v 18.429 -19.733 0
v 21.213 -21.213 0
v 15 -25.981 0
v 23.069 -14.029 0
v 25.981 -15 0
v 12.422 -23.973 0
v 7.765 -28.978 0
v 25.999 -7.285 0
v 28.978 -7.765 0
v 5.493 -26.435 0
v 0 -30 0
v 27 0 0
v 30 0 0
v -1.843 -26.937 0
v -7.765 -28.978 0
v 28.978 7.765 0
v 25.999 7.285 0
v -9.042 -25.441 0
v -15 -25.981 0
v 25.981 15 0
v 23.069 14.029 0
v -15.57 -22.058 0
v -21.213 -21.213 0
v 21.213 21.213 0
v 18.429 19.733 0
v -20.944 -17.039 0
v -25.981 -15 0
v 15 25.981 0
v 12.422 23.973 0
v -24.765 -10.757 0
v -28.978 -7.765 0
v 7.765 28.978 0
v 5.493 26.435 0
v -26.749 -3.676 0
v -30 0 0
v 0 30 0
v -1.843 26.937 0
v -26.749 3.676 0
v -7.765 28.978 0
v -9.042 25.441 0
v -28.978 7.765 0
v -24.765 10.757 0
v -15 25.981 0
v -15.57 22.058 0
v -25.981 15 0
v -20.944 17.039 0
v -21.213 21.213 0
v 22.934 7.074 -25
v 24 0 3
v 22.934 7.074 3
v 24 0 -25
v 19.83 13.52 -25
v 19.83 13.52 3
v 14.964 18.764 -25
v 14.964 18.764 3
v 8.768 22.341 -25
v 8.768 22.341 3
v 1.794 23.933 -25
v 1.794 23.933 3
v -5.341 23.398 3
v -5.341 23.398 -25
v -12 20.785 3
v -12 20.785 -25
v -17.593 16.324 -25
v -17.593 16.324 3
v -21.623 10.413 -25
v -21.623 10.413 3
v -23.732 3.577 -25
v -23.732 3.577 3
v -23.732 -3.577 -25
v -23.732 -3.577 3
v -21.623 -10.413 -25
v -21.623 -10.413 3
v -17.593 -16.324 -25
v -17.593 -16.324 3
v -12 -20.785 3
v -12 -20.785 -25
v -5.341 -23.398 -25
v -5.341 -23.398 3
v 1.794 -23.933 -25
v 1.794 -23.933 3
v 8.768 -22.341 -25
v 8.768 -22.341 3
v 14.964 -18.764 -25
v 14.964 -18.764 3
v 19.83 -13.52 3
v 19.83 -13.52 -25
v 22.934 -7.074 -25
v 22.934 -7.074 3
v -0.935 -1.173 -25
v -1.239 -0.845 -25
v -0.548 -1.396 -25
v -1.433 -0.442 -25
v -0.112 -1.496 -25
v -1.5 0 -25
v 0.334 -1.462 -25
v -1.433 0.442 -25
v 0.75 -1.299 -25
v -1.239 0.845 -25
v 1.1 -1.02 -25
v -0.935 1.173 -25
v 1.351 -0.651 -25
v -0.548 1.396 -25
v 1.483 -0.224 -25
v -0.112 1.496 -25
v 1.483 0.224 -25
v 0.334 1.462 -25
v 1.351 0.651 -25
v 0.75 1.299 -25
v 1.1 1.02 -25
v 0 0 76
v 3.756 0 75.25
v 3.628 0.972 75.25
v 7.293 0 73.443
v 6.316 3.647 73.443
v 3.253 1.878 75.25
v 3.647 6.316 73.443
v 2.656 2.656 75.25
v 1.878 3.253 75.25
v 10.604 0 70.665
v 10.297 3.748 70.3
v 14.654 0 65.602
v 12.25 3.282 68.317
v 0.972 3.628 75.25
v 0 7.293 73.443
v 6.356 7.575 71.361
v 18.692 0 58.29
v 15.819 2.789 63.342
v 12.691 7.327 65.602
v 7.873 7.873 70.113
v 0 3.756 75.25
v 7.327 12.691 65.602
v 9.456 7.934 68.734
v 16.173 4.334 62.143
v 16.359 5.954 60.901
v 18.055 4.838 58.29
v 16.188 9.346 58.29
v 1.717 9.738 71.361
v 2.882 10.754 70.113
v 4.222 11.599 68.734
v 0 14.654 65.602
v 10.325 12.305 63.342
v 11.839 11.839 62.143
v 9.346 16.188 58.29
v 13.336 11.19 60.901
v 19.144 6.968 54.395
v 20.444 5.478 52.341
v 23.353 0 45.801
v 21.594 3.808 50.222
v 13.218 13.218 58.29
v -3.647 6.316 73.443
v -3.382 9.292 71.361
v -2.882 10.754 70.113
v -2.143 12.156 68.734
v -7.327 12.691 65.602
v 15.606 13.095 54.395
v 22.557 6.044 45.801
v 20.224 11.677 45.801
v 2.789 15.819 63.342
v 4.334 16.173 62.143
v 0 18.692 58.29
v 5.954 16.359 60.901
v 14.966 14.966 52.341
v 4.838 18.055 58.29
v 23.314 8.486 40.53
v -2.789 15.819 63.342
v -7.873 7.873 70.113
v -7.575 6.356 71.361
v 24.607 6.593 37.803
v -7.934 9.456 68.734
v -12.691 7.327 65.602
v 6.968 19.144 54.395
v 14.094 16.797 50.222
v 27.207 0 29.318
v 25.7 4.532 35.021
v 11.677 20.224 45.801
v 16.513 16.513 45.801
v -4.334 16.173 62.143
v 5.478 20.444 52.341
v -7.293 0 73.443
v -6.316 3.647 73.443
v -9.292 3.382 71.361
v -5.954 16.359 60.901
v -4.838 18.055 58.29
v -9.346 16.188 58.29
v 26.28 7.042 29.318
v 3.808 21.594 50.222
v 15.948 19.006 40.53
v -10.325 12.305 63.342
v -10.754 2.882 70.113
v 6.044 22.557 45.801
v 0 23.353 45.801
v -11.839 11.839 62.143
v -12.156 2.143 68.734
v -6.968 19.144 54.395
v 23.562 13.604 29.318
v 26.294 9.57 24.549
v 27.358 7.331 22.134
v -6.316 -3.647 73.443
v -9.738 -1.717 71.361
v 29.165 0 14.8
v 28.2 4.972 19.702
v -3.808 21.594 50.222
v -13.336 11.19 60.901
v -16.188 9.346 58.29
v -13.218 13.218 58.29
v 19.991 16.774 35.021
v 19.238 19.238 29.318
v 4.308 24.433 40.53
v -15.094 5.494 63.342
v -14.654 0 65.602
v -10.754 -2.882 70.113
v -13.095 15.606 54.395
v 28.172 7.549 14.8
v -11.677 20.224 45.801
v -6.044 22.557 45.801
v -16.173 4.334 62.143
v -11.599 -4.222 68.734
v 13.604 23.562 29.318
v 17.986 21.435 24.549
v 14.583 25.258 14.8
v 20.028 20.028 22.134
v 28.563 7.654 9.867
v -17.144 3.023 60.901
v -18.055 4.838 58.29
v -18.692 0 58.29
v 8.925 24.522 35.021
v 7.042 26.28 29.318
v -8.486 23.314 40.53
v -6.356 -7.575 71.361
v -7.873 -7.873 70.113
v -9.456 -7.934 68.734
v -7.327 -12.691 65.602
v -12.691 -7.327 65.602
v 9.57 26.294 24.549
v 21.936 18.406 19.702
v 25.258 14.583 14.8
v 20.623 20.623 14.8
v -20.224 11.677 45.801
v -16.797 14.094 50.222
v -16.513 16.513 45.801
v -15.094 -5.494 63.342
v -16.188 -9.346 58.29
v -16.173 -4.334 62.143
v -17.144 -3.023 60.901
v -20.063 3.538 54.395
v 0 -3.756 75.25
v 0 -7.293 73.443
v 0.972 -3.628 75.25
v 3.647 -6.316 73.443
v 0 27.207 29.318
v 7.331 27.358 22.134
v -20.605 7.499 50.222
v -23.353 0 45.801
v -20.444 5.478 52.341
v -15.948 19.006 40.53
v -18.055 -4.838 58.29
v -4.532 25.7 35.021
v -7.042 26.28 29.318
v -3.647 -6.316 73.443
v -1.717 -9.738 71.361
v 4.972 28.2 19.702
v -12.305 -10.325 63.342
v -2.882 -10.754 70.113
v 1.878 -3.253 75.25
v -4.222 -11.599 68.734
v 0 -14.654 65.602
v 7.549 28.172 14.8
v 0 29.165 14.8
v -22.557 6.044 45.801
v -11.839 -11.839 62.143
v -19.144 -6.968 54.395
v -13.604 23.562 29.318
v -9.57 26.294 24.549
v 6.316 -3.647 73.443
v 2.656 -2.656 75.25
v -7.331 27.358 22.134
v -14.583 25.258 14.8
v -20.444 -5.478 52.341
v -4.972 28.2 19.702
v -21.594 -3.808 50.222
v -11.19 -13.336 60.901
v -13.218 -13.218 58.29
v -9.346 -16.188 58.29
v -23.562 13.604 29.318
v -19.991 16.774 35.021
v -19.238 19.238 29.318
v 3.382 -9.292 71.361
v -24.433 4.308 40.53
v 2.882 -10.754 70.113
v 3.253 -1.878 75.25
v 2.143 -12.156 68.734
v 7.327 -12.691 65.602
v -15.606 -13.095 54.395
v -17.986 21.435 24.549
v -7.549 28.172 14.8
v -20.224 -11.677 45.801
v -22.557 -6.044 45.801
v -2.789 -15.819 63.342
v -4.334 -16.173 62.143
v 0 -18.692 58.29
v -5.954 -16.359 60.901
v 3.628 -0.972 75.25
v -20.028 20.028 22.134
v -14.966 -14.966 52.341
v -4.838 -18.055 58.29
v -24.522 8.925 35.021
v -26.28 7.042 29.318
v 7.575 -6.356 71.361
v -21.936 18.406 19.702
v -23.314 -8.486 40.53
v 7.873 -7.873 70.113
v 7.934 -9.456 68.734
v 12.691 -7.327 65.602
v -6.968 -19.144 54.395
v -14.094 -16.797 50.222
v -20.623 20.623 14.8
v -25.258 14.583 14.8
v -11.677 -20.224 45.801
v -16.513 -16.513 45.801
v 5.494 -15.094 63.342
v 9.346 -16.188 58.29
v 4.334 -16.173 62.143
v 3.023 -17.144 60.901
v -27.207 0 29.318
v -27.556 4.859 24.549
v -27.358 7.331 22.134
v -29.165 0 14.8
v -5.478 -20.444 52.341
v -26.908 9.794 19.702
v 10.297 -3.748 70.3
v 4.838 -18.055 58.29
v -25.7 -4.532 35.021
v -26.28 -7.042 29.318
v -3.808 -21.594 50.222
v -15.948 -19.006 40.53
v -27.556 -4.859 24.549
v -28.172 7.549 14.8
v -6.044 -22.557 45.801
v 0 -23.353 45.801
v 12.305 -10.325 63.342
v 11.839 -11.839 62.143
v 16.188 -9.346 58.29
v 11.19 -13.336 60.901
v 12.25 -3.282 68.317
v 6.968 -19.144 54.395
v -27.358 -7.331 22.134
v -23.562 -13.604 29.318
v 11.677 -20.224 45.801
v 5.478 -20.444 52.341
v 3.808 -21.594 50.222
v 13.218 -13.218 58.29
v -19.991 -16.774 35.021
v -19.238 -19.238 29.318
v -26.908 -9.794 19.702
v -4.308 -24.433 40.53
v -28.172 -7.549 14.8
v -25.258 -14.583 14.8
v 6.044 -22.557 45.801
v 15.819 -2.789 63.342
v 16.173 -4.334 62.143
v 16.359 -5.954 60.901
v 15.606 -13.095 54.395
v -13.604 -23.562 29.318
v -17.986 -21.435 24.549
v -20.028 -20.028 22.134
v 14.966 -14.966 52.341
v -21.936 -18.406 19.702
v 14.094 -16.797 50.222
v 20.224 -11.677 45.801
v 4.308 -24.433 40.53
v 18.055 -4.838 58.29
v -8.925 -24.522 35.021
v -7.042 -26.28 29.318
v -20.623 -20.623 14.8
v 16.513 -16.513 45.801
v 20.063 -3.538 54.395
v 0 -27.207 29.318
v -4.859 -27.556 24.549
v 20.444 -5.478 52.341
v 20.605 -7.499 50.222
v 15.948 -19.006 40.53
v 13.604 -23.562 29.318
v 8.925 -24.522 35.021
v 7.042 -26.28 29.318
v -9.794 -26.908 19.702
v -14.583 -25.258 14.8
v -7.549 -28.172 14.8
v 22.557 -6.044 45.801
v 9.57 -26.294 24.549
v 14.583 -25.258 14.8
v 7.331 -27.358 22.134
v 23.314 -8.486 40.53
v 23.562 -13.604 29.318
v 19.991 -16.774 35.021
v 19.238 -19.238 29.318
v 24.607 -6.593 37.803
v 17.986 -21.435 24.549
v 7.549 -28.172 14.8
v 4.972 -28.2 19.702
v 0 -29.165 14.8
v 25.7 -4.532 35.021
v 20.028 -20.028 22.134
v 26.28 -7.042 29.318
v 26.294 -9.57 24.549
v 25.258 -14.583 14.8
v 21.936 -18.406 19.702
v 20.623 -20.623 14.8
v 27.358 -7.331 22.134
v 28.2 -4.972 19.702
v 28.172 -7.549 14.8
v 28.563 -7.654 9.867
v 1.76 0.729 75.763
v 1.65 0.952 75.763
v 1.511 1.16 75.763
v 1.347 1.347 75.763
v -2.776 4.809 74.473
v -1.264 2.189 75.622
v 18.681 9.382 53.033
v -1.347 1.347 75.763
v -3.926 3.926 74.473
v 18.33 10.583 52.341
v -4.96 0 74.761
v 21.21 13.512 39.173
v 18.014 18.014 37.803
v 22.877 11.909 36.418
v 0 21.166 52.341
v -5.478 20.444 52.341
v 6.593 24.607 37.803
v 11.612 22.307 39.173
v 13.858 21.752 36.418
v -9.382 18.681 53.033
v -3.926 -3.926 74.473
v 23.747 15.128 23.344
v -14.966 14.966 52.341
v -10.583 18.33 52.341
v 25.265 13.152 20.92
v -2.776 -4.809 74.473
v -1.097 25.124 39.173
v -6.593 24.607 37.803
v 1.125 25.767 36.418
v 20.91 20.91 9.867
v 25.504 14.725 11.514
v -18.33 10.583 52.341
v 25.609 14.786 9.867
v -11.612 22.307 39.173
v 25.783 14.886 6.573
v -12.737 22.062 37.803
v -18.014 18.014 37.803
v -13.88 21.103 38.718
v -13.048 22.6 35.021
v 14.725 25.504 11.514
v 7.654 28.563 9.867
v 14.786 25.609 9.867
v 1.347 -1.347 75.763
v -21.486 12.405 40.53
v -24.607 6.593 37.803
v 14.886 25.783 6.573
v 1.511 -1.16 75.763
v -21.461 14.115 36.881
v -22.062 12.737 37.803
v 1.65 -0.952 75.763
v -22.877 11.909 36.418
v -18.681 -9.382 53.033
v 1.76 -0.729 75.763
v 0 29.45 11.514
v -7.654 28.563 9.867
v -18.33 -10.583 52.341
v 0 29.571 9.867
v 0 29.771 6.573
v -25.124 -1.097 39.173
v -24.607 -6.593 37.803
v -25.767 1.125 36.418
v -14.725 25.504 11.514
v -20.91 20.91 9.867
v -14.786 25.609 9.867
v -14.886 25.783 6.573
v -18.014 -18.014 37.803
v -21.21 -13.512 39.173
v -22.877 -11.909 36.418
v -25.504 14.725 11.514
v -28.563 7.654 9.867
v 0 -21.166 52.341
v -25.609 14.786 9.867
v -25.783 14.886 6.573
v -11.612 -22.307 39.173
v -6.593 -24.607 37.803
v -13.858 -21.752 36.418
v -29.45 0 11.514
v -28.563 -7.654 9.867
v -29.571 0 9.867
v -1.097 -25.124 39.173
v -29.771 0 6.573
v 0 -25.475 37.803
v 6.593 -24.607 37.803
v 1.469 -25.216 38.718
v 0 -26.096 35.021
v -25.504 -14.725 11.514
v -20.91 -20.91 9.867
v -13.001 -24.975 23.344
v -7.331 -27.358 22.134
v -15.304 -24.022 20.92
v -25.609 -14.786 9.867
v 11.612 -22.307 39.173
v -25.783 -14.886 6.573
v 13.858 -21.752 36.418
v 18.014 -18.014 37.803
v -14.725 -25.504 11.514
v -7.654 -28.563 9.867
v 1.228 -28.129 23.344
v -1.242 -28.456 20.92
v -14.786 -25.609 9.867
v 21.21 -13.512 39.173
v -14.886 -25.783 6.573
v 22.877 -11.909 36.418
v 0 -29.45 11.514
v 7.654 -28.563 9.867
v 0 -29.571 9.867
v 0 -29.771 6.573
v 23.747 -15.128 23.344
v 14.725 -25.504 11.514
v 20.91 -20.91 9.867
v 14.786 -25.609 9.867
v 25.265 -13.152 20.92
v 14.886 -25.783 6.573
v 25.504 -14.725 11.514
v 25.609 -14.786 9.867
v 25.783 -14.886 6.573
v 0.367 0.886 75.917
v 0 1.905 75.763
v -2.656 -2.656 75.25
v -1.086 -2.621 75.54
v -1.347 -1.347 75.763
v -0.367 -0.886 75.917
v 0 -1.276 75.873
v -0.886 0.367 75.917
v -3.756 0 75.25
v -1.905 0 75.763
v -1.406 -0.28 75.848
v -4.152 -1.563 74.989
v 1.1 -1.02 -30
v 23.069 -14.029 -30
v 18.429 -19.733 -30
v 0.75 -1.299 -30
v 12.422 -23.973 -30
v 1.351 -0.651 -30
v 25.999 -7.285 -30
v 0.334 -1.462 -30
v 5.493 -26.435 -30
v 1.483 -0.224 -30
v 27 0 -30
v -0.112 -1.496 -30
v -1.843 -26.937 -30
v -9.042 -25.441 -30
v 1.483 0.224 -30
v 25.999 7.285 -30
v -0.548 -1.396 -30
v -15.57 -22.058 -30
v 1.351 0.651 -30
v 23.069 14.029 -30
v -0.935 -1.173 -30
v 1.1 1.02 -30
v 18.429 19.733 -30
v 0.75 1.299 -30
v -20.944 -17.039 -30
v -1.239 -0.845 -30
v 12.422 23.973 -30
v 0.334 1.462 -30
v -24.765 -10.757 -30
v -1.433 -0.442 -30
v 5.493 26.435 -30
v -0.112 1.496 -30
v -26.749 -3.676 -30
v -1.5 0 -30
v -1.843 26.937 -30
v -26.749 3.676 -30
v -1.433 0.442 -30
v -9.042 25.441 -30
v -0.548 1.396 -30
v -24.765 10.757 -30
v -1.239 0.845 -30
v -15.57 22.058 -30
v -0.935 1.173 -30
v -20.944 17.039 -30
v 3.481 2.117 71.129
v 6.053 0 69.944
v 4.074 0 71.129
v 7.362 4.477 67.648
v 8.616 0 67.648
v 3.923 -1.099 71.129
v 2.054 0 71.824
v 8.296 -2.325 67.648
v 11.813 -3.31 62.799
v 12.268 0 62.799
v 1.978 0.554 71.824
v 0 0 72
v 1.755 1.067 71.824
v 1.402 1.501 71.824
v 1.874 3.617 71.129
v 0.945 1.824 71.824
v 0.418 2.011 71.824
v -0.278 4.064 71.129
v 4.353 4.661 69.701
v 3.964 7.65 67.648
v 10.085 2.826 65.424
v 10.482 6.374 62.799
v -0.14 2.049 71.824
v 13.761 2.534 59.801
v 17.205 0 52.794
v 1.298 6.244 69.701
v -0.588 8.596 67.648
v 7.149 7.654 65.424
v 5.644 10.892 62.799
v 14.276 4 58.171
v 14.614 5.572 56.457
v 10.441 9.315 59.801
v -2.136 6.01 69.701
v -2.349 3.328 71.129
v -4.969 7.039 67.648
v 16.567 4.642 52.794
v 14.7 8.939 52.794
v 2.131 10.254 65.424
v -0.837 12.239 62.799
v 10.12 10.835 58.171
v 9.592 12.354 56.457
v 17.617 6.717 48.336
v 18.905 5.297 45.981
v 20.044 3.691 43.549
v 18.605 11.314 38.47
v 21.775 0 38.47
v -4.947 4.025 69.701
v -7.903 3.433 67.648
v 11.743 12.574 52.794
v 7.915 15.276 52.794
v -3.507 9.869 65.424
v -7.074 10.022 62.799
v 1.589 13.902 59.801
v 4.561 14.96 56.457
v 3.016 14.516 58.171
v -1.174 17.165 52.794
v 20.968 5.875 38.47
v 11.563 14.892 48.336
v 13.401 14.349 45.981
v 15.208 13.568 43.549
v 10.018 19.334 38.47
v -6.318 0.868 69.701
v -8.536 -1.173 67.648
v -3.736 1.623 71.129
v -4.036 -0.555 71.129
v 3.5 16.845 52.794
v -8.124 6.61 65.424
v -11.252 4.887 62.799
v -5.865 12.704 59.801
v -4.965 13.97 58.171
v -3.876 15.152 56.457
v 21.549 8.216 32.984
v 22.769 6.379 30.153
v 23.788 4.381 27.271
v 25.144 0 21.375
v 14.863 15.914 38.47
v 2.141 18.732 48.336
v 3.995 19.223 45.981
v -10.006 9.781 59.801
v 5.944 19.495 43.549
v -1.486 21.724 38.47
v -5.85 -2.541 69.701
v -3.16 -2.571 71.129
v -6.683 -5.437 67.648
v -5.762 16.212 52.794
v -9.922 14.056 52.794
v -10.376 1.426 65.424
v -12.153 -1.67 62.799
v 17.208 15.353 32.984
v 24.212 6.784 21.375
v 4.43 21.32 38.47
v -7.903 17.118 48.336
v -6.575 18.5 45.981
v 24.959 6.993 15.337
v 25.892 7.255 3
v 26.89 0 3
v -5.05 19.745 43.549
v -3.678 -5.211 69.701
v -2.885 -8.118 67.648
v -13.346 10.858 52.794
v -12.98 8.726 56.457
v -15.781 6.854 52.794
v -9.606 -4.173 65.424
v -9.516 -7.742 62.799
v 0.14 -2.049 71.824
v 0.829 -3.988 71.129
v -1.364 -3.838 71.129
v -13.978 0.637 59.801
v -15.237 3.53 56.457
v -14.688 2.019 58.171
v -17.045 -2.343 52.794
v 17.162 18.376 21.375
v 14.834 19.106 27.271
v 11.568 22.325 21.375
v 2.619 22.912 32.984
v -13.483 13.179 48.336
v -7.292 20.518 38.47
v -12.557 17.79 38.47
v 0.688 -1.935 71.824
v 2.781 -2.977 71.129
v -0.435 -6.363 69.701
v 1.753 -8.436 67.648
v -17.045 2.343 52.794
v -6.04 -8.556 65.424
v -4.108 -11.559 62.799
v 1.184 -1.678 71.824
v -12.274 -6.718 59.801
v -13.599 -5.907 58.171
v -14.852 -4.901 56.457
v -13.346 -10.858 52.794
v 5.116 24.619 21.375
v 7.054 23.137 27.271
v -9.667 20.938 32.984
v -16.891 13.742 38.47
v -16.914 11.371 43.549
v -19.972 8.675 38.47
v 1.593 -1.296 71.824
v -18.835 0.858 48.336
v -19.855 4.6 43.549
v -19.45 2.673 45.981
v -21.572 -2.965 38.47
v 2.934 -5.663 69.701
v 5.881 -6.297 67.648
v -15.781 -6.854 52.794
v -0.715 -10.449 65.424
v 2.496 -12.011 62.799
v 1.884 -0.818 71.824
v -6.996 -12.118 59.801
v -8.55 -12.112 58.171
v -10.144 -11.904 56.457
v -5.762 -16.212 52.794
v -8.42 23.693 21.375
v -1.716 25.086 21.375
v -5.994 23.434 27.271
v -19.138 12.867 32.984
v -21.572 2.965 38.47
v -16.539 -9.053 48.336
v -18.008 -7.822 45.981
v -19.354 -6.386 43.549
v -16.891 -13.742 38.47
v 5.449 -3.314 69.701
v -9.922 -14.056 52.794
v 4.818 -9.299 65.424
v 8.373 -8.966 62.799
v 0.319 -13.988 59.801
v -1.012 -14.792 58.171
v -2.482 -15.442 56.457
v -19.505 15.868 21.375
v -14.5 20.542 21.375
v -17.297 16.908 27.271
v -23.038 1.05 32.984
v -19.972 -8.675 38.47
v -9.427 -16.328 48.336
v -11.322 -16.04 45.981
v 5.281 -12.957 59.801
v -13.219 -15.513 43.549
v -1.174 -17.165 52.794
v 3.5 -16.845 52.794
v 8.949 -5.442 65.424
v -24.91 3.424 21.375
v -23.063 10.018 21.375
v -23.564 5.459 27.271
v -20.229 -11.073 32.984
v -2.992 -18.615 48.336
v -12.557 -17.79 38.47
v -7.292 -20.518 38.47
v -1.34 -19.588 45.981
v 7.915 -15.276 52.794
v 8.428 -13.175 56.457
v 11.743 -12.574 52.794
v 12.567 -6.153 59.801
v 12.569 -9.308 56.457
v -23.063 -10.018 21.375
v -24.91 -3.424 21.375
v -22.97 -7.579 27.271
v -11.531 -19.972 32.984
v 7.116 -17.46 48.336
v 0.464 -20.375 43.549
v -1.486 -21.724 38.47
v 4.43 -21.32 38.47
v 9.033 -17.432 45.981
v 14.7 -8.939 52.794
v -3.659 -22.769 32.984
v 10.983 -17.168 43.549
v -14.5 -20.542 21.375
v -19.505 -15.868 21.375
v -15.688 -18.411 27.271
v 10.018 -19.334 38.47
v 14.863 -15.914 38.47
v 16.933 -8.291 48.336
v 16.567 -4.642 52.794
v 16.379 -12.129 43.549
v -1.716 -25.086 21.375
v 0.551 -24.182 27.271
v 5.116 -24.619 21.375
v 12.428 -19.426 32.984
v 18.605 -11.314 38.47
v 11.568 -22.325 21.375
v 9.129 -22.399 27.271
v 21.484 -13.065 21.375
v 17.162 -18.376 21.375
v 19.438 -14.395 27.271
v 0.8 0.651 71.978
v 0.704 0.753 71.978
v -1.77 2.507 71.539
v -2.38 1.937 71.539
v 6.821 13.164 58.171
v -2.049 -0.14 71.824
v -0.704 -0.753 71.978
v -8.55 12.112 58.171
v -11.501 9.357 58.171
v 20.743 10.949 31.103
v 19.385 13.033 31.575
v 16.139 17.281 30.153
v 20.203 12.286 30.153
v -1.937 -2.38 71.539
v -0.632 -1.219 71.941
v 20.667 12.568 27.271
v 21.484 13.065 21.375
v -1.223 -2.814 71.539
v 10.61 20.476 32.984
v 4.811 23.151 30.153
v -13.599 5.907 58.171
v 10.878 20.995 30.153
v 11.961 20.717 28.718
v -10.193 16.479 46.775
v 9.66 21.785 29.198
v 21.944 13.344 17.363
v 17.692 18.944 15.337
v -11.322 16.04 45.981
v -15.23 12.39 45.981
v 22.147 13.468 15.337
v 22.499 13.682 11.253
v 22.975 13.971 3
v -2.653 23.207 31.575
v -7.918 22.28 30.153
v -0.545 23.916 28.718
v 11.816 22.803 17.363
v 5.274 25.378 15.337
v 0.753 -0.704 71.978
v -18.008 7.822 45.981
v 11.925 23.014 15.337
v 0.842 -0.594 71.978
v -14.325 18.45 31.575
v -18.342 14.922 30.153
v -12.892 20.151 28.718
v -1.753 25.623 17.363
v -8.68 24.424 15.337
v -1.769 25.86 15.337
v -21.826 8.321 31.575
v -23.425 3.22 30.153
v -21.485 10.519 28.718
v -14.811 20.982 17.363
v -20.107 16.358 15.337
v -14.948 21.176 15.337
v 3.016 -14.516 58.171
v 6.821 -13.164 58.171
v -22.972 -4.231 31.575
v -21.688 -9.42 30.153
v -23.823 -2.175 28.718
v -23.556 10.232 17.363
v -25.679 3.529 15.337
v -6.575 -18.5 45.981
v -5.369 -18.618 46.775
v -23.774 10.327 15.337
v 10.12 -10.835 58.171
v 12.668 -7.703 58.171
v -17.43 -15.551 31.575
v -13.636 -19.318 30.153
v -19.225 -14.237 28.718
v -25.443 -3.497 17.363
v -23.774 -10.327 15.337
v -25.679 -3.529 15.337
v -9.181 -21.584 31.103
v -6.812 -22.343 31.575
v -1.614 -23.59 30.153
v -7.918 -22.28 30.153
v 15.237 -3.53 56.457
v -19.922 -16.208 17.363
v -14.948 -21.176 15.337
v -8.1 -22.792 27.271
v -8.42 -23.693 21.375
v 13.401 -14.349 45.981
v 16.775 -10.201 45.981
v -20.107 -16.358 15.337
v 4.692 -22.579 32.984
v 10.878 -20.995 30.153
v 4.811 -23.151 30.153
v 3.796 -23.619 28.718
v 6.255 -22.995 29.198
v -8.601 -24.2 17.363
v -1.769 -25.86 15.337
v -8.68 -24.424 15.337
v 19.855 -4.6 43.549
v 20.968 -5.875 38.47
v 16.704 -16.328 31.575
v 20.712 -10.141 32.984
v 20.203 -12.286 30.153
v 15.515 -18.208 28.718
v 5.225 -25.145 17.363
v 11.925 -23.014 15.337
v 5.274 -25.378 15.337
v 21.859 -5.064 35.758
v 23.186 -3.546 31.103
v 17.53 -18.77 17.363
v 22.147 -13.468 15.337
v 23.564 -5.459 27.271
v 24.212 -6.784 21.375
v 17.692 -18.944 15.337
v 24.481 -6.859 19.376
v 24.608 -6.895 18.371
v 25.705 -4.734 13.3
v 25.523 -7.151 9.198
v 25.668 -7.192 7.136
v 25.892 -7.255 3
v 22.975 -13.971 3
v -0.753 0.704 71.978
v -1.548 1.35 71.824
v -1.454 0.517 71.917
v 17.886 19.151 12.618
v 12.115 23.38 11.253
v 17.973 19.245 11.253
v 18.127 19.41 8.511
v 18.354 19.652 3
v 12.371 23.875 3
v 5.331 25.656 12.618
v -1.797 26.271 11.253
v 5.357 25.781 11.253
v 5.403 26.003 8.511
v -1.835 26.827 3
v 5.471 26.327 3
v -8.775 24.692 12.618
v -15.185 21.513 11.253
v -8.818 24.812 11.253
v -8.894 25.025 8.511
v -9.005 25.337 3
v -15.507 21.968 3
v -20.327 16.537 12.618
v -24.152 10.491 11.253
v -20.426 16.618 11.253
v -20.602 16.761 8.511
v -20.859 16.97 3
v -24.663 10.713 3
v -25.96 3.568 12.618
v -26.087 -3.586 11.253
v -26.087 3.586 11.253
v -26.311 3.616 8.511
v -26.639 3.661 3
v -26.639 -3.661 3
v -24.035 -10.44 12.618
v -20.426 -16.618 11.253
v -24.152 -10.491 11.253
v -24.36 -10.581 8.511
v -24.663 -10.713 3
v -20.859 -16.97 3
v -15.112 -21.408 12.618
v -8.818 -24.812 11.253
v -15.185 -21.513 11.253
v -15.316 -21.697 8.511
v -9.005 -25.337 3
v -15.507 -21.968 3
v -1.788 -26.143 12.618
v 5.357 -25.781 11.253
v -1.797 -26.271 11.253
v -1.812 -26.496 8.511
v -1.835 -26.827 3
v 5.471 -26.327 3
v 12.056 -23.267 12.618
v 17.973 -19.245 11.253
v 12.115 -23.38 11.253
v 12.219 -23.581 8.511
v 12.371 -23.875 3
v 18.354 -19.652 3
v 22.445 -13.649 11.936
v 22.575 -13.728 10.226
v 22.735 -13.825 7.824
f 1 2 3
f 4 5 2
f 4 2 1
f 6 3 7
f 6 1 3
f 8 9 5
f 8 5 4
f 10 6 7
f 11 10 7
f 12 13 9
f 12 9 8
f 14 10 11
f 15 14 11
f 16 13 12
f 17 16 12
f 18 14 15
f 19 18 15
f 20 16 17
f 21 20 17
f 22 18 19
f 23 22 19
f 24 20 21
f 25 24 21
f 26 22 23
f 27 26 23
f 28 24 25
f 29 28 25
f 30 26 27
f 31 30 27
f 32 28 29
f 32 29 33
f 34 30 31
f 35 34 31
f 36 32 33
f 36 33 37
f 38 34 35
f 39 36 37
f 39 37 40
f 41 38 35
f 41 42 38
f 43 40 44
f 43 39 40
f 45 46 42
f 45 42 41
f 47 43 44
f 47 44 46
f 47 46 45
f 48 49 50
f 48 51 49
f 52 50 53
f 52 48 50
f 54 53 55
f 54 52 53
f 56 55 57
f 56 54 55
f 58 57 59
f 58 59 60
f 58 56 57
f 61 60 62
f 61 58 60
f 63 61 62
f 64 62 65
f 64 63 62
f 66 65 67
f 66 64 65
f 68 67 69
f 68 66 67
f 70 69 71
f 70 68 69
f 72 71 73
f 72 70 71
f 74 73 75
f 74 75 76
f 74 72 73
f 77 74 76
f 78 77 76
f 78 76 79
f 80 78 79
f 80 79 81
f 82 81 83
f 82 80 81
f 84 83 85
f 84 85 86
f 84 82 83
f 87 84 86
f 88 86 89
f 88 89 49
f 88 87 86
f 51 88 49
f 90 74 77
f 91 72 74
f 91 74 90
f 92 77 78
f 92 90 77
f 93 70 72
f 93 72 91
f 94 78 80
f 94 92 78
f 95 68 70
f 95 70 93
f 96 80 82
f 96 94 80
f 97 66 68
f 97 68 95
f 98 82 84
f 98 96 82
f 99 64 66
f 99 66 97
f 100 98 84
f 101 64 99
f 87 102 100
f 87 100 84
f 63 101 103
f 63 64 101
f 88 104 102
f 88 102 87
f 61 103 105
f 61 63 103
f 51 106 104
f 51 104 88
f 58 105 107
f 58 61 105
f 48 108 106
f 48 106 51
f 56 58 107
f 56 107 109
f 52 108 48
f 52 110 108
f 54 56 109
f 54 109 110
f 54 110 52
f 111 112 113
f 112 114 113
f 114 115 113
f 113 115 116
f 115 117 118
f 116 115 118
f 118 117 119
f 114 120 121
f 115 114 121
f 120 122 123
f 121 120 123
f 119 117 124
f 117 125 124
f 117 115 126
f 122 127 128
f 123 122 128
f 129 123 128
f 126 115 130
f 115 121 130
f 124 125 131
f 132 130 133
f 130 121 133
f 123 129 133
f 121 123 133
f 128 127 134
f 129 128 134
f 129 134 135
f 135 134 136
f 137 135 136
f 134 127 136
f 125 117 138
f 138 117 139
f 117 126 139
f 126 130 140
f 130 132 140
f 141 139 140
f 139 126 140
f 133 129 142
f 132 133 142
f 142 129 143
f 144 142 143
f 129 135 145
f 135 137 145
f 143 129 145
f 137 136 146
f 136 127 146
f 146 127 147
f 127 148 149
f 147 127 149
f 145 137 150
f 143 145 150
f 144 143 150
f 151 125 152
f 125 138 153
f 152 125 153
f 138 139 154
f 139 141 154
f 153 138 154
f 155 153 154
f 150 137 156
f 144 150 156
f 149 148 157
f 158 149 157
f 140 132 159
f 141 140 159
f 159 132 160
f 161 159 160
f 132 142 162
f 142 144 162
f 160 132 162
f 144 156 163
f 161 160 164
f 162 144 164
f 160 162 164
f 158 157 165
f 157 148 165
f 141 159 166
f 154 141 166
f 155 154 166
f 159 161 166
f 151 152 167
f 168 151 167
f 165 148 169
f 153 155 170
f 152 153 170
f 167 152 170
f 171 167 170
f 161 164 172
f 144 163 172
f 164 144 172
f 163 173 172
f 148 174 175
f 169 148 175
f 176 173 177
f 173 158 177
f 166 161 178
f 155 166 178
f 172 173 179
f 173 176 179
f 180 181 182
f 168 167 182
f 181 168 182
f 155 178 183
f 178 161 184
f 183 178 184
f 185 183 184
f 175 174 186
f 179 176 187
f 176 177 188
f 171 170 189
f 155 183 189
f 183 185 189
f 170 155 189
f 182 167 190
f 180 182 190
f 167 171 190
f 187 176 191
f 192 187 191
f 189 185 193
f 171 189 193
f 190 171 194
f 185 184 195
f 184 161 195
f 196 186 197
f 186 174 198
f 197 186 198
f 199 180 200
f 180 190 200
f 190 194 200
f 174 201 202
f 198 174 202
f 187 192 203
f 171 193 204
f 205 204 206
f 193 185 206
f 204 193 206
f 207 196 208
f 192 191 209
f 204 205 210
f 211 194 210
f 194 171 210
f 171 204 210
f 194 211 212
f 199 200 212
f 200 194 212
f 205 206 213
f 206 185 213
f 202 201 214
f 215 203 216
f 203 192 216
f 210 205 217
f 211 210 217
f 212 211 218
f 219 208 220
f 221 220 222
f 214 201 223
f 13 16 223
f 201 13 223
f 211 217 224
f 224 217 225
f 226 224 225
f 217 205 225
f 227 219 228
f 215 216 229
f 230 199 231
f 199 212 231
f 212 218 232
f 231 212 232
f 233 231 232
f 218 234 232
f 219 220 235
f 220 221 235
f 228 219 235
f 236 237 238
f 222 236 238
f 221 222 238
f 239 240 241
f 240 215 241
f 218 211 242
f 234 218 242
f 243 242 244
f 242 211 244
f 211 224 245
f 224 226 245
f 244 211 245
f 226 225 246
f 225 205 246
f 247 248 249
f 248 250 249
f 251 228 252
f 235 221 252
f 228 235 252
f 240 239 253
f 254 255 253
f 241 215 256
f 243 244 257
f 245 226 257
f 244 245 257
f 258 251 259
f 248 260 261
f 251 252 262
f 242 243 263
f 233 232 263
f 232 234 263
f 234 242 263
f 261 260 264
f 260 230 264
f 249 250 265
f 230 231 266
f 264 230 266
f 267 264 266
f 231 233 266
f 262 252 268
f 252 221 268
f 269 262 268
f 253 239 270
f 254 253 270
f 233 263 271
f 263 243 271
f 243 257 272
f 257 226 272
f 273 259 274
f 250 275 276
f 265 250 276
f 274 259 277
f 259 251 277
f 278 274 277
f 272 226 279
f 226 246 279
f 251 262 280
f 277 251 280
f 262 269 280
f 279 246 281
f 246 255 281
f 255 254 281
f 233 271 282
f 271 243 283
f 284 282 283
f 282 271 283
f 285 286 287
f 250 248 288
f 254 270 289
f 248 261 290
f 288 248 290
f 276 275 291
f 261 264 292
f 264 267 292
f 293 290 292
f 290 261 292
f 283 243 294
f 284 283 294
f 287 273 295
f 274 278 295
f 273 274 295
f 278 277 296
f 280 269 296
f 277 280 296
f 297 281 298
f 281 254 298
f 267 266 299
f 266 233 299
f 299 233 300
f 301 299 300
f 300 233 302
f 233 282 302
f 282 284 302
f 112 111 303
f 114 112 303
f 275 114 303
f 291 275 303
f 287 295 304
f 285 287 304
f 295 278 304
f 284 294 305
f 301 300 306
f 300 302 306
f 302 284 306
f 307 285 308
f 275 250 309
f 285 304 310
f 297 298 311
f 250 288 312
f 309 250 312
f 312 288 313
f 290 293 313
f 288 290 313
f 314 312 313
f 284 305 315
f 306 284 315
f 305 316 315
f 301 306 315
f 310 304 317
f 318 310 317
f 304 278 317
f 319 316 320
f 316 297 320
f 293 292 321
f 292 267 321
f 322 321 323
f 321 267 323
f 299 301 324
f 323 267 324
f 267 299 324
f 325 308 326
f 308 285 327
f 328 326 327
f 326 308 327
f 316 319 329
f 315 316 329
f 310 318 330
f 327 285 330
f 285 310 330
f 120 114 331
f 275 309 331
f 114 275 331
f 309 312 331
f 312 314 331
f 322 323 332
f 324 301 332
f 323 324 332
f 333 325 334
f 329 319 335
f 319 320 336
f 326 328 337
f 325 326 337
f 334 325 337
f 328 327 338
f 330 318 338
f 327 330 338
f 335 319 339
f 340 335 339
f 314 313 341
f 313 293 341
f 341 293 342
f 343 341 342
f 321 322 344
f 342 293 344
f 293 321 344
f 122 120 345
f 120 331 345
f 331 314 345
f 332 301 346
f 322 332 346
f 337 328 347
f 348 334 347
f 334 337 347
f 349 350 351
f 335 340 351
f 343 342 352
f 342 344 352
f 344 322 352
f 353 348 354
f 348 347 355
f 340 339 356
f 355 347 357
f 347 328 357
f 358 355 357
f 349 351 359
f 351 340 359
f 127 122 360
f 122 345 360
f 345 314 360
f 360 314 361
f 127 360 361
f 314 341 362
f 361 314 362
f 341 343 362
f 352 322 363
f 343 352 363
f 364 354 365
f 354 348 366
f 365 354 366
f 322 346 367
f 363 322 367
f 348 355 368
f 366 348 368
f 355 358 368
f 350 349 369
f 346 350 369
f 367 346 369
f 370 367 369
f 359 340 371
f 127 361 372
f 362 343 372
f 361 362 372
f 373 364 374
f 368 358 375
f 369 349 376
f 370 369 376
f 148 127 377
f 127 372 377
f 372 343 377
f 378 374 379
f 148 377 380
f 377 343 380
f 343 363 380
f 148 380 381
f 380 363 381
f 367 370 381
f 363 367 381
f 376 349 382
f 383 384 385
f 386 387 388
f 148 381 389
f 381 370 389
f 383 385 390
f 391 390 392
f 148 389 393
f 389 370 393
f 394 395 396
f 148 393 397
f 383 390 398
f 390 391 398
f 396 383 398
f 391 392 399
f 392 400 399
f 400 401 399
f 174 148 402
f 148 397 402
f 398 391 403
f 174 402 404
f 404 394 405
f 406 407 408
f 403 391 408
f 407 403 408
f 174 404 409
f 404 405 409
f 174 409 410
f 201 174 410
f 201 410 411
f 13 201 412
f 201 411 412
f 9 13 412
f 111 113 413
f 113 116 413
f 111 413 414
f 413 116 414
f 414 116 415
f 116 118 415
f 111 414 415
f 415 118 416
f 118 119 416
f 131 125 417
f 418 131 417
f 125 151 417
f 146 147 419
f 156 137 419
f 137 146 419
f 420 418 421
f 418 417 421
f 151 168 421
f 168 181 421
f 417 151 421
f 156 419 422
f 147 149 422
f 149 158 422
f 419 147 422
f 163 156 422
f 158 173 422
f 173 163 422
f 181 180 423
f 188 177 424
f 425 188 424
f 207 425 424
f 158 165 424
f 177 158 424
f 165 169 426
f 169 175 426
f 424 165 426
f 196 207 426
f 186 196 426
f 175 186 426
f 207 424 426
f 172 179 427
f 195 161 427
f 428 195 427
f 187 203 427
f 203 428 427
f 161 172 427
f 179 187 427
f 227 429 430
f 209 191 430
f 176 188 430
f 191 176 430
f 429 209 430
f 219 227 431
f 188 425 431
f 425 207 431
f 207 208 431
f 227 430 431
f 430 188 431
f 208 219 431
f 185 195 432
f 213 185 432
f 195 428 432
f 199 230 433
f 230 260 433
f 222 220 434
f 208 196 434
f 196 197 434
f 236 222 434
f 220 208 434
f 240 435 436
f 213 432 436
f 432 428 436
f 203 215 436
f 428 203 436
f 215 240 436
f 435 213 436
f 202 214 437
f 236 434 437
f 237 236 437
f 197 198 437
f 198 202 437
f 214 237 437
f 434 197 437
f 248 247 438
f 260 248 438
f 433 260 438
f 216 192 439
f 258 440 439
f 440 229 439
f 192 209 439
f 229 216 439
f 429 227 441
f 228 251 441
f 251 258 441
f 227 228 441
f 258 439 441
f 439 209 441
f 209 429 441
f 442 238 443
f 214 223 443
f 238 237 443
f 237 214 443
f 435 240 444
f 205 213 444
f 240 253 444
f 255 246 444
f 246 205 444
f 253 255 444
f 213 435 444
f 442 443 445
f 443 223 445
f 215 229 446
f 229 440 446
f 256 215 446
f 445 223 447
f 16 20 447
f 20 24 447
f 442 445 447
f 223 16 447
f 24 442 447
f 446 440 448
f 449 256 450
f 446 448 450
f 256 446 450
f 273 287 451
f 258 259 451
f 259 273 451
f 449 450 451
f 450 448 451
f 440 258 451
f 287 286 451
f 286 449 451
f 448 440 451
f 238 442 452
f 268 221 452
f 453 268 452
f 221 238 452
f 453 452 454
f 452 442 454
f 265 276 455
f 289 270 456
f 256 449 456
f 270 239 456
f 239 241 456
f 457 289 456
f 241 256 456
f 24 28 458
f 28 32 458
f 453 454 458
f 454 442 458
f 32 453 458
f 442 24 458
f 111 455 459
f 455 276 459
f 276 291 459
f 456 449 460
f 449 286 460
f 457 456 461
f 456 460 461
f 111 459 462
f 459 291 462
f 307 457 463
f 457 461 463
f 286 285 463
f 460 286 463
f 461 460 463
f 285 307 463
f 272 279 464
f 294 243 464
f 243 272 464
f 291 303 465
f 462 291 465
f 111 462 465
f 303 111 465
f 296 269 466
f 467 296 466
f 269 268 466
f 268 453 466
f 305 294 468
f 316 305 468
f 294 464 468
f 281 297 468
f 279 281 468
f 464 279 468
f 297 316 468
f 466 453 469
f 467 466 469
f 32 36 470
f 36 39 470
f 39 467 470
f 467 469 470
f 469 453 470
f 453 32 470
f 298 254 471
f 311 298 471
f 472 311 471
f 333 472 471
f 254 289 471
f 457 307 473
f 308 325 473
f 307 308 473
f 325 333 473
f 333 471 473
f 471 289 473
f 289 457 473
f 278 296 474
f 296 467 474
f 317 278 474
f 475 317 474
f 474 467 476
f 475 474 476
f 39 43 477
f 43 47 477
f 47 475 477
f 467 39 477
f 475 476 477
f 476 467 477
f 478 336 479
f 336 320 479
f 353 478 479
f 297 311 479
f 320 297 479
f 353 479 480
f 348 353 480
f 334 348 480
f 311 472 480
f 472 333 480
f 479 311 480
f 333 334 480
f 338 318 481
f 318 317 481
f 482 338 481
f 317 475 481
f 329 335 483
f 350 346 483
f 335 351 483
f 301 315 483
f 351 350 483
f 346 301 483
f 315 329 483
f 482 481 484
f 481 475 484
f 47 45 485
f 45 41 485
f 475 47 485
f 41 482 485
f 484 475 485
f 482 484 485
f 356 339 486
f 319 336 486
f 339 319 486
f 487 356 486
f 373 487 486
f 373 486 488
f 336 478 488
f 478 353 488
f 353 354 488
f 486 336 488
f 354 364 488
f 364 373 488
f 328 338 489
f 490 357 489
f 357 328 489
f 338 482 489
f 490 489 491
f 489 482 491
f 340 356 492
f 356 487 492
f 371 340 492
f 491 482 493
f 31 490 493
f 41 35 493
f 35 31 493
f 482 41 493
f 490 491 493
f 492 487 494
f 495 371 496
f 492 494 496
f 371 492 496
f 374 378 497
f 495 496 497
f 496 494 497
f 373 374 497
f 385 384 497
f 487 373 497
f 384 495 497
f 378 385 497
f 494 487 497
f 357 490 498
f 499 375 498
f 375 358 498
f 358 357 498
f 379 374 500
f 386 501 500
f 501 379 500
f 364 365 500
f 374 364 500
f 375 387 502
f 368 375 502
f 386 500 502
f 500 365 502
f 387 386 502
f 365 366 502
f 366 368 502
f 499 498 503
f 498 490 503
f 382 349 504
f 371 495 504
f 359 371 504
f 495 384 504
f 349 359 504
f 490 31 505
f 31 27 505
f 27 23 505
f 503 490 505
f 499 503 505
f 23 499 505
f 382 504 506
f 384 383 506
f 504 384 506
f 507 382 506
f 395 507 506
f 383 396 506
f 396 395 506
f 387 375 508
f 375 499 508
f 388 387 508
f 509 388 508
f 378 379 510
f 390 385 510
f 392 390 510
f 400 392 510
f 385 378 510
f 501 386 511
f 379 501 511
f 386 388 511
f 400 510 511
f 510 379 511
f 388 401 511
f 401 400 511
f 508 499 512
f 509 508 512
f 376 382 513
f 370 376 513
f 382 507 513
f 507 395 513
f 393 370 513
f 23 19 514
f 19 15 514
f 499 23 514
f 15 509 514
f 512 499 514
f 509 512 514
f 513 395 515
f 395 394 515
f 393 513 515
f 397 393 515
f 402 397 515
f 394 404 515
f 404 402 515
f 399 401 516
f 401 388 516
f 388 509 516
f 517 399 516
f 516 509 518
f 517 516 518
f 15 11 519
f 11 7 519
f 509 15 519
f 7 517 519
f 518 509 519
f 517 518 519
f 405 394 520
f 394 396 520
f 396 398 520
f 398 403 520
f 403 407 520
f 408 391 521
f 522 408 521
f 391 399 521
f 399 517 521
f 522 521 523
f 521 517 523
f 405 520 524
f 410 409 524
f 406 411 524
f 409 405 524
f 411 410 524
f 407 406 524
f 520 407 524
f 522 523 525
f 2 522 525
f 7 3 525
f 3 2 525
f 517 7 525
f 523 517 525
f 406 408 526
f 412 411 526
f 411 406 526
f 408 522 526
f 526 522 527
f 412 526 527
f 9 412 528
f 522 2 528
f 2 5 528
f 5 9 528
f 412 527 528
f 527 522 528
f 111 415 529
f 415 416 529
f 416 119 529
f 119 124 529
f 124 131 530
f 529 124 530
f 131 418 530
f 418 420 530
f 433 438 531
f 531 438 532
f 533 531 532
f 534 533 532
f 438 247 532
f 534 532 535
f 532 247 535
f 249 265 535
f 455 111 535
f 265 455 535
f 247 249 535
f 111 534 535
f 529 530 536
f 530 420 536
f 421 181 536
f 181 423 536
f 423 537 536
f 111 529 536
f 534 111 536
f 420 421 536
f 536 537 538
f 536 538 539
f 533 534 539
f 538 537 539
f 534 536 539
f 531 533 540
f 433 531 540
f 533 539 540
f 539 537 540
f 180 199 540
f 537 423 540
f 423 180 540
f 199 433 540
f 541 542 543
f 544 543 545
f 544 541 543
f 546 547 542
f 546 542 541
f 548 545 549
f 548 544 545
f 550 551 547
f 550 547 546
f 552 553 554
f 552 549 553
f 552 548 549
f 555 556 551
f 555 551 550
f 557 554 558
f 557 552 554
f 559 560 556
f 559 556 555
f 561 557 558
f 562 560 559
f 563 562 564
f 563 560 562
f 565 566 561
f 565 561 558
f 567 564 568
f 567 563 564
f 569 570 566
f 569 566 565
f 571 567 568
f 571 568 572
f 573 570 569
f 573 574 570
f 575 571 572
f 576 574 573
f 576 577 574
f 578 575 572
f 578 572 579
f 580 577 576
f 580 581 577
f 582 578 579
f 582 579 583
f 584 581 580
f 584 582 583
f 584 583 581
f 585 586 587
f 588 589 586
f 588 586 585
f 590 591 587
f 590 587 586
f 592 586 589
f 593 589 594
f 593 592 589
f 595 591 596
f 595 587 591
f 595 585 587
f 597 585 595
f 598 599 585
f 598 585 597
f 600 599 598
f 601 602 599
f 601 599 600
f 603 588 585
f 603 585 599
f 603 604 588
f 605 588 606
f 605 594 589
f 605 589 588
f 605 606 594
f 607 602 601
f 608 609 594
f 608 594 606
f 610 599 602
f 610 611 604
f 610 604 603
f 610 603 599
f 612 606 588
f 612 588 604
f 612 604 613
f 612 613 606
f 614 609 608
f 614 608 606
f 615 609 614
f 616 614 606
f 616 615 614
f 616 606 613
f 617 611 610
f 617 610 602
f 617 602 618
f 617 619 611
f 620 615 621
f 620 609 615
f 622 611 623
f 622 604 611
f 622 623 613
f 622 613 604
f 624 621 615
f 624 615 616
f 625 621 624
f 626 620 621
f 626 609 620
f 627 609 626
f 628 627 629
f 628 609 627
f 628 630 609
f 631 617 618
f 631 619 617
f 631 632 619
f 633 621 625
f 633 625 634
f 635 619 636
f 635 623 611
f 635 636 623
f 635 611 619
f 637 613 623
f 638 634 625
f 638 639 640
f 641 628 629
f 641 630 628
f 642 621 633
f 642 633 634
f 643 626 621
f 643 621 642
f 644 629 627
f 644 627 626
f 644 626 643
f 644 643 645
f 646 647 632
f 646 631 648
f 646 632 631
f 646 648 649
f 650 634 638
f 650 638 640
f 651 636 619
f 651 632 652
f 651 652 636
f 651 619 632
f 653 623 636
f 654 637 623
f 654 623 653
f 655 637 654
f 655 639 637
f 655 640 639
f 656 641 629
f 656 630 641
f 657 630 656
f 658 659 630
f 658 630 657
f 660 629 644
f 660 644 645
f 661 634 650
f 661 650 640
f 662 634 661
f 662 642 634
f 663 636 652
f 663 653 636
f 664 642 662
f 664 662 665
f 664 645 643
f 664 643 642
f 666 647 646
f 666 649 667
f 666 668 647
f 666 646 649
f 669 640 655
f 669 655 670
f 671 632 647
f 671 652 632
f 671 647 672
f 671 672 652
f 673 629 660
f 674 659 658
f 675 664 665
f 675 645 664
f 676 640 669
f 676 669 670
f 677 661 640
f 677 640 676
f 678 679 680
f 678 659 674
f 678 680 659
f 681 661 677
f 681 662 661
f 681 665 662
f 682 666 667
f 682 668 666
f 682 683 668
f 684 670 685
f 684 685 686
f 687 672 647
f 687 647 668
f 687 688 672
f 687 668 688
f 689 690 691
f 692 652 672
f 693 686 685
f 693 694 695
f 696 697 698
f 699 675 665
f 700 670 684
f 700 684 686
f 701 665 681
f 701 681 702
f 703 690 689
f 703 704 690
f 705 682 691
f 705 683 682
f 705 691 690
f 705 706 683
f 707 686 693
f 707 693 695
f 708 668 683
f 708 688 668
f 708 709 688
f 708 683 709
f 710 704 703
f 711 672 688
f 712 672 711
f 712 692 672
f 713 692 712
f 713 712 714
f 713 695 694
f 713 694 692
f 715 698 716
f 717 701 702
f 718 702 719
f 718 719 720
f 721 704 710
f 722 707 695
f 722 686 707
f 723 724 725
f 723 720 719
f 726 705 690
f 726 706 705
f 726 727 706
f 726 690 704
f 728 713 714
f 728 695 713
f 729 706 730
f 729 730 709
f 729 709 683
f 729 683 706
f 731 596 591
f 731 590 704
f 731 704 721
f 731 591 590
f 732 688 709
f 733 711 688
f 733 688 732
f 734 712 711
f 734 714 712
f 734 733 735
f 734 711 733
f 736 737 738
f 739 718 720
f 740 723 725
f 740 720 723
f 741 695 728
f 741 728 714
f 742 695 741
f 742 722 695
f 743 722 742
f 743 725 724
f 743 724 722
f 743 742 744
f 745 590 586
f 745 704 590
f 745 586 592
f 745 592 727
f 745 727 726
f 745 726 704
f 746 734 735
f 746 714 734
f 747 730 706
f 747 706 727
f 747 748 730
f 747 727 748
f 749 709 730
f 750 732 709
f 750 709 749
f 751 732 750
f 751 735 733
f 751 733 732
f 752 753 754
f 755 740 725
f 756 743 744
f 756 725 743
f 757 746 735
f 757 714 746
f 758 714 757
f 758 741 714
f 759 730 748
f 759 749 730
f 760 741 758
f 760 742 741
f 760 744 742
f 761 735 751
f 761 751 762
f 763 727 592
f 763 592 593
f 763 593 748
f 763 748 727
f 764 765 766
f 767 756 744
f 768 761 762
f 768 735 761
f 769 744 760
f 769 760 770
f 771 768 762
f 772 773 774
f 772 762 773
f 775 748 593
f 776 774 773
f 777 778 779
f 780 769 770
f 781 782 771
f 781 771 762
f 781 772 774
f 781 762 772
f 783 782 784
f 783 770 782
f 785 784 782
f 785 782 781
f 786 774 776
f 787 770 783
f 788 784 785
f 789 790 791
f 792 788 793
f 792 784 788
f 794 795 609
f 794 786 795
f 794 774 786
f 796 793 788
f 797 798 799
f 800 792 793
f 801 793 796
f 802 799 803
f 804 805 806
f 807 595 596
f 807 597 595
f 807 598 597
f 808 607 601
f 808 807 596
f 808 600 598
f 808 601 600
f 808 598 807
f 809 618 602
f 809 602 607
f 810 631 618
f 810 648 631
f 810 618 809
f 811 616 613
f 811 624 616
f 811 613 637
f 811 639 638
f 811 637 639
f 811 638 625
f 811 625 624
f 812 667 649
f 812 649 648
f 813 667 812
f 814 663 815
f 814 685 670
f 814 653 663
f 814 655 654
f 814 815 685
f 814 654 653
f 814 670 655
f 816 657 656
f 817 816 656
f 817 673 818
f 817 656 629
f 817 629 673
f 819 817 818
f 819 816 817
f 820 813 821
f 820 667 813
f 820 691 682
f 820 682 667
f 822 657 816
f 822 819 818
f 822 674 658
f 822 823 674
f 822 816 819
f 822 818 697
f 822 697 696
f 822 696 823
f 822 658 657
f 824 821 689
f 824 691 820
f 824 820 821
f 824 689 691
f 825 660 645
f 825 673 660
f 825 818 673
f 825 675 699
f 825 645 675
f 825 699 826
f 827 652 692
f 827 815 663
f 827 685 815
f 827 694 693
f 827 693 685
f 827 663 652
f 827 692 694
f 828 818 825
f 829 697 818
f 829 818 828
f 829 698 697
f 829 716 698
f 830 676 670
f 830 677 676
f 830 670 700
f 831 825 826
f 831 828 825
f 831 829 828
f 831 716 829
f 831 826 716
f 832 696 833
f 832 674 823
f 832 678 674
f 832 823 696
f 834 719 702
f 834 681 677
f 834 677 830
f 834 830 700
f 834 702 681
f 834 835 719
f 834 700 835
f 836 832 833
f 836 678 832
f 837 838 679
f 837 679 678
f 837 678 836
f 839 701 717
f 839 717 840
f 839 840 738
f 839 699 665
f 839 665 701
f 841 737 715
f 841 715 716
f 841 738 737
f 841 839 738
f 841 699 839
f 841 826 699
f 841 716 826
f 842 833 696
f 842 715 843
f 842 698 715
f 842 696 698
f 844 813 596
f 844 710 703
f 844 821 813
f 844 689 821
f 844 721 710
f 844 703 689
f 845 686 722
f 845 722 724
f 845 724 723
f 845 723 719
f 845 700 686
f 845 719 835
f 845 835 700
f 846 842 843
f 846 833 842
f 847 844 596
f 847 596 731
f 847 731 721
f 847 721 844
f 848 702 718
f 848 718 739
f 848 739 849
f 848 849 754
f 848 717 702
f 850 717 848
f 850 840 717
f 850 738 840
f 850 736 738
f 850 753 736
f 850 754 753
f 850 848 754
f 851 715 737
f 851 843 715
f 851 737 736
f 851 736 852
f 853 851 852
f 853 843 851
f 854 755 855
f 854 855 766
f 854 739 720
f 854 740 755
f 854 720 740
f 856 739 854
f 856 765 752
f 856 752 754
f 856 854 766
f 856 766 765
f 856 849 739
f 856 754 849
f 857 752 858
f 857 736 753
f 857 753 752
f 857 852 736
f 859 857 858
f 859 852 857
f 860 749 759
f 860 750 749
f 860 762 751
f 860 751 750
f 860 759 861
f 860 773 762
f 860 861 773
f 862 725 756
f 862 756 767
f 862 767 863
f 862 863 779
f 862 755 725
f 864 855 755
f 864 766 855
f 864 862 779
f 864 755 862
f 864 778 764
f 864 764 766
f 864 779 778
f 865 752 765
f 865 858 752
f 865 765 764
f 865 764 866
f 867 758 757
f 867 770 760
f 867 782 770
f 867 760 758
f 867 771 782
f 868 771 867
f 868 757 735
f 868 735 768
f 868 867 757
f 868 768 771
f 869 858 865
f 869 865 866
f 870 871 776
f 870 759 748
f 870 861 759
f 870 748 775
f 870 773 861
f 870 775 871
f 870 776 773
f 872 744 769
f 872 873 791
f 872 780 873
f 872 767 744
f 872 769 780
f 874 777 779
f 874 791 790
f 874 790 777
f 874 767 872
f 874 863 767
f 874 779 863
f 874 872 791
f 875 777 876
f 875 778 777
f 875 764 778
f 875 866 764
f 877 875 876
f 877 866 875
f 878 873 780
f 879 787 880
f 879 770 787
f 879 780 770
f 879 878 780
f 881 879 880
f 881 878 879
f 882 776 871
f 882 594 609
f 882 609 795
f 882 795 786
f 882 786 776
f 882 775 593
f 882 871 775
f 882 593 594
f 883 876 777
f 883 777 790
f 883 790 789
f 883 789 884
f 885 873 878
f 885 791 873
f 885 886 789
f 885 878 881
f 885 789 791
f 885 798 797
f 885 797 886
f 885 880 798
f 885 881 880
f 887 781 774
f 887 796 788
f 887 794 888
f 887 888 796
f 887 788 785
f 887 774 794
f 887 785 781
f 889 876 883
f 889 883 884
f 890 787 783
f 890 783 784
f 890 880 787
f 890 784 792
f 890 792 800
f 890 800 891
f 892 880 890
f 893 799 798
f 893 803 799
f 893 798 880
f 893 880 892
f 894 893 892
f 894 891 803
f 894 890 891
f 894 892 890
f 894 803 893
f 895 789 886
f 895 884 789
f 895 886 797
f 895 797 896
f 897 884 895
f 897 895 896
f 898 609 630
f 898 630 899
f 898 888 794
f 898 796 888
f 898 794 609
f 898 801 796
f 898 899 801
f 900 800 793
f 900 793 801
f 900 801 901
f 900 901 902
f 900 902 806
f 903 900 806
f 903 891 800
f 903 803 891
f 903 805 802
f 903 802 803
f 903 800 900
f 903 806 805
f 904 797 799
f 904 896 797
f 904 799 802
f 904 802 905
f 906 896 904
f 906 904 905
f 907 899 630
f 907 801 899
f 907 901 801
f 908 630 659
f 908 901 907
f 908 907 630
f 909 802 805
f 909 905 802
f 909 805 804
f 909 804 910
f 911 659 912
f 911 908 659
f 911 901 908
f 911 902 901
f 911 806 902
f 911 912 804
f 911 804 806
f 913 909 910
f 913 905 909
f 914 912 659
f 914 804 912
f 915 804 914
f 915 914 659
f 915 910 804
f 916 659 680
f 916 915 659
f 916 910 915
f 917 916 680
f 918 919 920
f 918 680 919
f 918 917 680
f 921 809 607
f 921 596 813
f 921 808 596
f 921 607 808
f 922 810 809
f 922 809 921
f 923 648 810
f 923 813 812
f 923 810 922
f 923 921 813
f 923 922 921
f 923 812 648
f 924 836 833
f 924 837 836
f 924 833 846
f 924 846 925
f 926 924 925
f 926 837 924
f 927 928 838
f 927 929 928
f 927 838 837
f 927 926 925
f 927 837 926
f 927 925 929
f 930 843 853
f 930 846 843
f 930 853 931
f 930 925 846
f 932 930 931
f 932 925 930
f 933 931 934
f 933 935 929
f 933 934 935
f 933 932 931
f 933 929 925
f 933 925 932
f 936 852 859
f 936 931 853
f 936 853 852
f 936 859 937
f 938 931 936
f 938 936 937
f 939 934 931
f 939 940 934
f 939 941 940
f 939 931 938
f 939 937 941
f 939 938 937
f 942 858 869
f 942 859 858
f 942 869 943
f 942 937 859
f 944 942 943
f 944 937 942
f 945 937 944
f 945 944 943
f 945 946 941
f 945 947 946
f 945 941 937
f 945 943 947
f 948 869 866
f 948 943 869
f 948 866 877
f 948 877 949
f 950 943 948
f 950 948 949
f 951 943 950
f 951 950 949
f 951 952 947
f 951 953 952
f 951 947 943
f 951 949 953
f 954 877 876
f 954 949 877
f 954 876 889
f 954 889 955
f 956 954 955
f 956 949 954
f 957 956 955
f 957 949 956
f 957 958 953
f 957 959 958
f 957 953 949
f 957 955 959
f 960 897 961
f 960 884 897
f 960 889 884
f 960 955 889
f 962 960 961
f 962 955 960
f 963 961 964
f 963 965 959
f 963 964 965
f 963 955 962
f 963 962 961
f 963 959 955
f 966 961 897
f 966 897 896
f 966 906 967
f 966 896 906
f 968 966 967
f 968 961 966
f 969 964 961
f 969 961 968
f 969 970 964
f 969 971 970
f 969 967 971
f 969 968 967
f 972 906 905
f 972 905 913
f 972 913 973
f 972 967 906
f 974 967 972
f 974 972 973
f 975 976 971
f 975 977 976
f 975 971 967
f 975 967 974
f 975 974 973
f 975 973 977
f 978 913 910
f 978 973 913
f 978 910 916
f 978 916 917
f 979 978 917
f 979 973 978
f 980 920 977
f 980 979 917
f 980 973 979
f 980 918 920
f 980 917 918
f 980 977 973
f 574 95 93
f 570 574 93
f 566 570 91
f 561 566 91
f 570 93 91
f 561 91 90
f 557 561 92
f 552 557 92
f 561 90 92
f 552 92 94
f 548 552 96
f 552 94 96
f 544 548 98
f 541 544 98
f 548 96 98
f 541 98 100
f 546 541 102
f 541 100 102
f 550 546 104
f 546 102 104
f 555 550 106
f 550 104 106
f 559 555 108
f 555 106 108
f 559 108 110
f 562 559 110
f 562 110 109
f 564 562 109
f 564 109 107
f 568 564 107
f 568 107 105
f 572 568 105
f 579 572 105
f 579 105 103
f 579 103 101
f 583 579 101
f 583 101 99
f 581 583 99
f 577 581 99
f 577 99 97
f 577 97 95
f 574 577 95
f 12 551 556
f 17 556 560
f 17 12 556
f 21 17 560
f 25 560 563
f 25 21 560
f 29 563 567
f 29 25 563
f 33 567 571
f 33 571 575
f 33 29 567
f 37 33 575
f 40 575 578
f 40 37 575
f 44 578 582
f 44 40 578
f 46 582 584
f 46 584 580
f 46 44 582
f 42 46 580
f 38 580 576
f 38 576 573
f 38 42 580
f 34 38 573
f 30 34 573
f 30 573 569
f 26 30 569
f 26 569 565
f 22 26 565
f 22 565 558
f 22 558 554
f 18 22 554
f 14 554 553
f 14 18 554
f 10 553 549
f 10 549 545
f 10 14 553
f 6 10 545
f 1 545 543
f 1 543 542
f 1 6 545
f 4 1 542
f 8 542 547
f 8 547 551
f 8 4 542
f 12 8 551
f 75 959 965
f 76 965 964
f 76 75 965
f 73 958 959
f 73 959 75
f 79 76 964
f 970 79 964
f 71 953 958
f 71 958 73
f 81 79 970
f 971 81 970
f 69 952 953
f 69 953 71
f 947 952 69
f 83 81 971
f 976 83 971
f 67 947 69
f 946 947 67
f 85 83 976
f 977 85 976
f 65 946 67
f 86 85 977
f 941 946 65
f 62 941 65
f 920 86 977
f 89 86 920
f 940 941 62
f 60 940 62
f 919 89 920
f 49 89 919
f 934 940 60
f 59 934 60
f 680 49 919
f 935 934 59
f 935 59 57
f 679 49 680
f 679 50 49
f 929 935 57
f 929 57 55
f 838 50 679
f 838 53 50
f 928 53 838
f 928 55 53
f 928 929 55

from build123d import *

# Parameters (mm, degrees)
F4_D     = 3
F4_DEPTH = 12
F4_TIP   = 0.9012909285


with BuildPart() as f1:
    # F0 (on Front) → F1 (revolve)
    with BuildSketch(Plane.XZ):
        with BuildLine():
            add(Edge.make_bspline(
                [(26.8895727958, 3), (26.9346478476, 2.0004075938), (26.9715210375, 1.0001471851), (27, 0)],
                knots=[74.7734725715, 74.7734725715, 74.7734725715, 74.7734725715, 76.8960337079, 76.8960337079, 76.8960337079, 76.8960337079], degree=3))
            Line((27, 0), (30, 0))
            add(Edge.make_bspline(
                [(0, 76), (18.2135365903, 75.0966593623), (29.3766844422, 35.9996296465), (30, 0)],
                knots=[0, 0, 0, 0, 81.7067928633, 81.7067928633, 81.7067928633, 81.7067928633], degree=3))
            Line((0, 76), (0, 72))
            add(Edge.make_bspline(
                [(0, 72), (13.535191017, 72.5981812348), (25.3016712319, 38.2135889442), (26.8895727958, 3)],
                knots=[0, 0, 0, 0, 74.7734725715, 74.7734725715, 74.7734725715, 74.7734725715], degree=3))
        make_face()
        with BuildLine():
            Line((27, -30), (27, 0))
            add(Edge.make_bspline(
                [(26.8895727958, 3), (26.9346478476, 2.0004075938), (26.9715210375, 1.0001471851), (27, 0)],
                knots=[74.7734725715, 74.7734725715, 74.7734725715, 74.7734725715, 76.8960337079, 76.8960337079, 76.8960337079, 76.8960337079], degree=3))
            Line((26.8895727958, 3), (24, 3))
            Line((24, 3), (24, 0))
            Line((24, 0), (24, -25))
            Line((24, -25), (0, -25))
            Line((0, -25), (0, -30))
            Line((0, -30), (27, -30))
        make_face()
    revolve(axis=Axis((0, 0, 36), (0, 0, 1)))

    # F4
    with Locations(Plane(origin=(0, 0, -30), x_dir=(1, 0, 0), z_dir=(0, 0, -1))):
        with Locations((0, 0)):
            Hole(F4_D / 2, depth=F4_DEPTH)
            with Locations((0, 0, -(F4_DEPTH + F4_TIP / 2))):  # 118° drill point
                Cone(0, F4_D / 2, F4_TIP, mode=Mode.SUBTRACT)


solid = f1.part
